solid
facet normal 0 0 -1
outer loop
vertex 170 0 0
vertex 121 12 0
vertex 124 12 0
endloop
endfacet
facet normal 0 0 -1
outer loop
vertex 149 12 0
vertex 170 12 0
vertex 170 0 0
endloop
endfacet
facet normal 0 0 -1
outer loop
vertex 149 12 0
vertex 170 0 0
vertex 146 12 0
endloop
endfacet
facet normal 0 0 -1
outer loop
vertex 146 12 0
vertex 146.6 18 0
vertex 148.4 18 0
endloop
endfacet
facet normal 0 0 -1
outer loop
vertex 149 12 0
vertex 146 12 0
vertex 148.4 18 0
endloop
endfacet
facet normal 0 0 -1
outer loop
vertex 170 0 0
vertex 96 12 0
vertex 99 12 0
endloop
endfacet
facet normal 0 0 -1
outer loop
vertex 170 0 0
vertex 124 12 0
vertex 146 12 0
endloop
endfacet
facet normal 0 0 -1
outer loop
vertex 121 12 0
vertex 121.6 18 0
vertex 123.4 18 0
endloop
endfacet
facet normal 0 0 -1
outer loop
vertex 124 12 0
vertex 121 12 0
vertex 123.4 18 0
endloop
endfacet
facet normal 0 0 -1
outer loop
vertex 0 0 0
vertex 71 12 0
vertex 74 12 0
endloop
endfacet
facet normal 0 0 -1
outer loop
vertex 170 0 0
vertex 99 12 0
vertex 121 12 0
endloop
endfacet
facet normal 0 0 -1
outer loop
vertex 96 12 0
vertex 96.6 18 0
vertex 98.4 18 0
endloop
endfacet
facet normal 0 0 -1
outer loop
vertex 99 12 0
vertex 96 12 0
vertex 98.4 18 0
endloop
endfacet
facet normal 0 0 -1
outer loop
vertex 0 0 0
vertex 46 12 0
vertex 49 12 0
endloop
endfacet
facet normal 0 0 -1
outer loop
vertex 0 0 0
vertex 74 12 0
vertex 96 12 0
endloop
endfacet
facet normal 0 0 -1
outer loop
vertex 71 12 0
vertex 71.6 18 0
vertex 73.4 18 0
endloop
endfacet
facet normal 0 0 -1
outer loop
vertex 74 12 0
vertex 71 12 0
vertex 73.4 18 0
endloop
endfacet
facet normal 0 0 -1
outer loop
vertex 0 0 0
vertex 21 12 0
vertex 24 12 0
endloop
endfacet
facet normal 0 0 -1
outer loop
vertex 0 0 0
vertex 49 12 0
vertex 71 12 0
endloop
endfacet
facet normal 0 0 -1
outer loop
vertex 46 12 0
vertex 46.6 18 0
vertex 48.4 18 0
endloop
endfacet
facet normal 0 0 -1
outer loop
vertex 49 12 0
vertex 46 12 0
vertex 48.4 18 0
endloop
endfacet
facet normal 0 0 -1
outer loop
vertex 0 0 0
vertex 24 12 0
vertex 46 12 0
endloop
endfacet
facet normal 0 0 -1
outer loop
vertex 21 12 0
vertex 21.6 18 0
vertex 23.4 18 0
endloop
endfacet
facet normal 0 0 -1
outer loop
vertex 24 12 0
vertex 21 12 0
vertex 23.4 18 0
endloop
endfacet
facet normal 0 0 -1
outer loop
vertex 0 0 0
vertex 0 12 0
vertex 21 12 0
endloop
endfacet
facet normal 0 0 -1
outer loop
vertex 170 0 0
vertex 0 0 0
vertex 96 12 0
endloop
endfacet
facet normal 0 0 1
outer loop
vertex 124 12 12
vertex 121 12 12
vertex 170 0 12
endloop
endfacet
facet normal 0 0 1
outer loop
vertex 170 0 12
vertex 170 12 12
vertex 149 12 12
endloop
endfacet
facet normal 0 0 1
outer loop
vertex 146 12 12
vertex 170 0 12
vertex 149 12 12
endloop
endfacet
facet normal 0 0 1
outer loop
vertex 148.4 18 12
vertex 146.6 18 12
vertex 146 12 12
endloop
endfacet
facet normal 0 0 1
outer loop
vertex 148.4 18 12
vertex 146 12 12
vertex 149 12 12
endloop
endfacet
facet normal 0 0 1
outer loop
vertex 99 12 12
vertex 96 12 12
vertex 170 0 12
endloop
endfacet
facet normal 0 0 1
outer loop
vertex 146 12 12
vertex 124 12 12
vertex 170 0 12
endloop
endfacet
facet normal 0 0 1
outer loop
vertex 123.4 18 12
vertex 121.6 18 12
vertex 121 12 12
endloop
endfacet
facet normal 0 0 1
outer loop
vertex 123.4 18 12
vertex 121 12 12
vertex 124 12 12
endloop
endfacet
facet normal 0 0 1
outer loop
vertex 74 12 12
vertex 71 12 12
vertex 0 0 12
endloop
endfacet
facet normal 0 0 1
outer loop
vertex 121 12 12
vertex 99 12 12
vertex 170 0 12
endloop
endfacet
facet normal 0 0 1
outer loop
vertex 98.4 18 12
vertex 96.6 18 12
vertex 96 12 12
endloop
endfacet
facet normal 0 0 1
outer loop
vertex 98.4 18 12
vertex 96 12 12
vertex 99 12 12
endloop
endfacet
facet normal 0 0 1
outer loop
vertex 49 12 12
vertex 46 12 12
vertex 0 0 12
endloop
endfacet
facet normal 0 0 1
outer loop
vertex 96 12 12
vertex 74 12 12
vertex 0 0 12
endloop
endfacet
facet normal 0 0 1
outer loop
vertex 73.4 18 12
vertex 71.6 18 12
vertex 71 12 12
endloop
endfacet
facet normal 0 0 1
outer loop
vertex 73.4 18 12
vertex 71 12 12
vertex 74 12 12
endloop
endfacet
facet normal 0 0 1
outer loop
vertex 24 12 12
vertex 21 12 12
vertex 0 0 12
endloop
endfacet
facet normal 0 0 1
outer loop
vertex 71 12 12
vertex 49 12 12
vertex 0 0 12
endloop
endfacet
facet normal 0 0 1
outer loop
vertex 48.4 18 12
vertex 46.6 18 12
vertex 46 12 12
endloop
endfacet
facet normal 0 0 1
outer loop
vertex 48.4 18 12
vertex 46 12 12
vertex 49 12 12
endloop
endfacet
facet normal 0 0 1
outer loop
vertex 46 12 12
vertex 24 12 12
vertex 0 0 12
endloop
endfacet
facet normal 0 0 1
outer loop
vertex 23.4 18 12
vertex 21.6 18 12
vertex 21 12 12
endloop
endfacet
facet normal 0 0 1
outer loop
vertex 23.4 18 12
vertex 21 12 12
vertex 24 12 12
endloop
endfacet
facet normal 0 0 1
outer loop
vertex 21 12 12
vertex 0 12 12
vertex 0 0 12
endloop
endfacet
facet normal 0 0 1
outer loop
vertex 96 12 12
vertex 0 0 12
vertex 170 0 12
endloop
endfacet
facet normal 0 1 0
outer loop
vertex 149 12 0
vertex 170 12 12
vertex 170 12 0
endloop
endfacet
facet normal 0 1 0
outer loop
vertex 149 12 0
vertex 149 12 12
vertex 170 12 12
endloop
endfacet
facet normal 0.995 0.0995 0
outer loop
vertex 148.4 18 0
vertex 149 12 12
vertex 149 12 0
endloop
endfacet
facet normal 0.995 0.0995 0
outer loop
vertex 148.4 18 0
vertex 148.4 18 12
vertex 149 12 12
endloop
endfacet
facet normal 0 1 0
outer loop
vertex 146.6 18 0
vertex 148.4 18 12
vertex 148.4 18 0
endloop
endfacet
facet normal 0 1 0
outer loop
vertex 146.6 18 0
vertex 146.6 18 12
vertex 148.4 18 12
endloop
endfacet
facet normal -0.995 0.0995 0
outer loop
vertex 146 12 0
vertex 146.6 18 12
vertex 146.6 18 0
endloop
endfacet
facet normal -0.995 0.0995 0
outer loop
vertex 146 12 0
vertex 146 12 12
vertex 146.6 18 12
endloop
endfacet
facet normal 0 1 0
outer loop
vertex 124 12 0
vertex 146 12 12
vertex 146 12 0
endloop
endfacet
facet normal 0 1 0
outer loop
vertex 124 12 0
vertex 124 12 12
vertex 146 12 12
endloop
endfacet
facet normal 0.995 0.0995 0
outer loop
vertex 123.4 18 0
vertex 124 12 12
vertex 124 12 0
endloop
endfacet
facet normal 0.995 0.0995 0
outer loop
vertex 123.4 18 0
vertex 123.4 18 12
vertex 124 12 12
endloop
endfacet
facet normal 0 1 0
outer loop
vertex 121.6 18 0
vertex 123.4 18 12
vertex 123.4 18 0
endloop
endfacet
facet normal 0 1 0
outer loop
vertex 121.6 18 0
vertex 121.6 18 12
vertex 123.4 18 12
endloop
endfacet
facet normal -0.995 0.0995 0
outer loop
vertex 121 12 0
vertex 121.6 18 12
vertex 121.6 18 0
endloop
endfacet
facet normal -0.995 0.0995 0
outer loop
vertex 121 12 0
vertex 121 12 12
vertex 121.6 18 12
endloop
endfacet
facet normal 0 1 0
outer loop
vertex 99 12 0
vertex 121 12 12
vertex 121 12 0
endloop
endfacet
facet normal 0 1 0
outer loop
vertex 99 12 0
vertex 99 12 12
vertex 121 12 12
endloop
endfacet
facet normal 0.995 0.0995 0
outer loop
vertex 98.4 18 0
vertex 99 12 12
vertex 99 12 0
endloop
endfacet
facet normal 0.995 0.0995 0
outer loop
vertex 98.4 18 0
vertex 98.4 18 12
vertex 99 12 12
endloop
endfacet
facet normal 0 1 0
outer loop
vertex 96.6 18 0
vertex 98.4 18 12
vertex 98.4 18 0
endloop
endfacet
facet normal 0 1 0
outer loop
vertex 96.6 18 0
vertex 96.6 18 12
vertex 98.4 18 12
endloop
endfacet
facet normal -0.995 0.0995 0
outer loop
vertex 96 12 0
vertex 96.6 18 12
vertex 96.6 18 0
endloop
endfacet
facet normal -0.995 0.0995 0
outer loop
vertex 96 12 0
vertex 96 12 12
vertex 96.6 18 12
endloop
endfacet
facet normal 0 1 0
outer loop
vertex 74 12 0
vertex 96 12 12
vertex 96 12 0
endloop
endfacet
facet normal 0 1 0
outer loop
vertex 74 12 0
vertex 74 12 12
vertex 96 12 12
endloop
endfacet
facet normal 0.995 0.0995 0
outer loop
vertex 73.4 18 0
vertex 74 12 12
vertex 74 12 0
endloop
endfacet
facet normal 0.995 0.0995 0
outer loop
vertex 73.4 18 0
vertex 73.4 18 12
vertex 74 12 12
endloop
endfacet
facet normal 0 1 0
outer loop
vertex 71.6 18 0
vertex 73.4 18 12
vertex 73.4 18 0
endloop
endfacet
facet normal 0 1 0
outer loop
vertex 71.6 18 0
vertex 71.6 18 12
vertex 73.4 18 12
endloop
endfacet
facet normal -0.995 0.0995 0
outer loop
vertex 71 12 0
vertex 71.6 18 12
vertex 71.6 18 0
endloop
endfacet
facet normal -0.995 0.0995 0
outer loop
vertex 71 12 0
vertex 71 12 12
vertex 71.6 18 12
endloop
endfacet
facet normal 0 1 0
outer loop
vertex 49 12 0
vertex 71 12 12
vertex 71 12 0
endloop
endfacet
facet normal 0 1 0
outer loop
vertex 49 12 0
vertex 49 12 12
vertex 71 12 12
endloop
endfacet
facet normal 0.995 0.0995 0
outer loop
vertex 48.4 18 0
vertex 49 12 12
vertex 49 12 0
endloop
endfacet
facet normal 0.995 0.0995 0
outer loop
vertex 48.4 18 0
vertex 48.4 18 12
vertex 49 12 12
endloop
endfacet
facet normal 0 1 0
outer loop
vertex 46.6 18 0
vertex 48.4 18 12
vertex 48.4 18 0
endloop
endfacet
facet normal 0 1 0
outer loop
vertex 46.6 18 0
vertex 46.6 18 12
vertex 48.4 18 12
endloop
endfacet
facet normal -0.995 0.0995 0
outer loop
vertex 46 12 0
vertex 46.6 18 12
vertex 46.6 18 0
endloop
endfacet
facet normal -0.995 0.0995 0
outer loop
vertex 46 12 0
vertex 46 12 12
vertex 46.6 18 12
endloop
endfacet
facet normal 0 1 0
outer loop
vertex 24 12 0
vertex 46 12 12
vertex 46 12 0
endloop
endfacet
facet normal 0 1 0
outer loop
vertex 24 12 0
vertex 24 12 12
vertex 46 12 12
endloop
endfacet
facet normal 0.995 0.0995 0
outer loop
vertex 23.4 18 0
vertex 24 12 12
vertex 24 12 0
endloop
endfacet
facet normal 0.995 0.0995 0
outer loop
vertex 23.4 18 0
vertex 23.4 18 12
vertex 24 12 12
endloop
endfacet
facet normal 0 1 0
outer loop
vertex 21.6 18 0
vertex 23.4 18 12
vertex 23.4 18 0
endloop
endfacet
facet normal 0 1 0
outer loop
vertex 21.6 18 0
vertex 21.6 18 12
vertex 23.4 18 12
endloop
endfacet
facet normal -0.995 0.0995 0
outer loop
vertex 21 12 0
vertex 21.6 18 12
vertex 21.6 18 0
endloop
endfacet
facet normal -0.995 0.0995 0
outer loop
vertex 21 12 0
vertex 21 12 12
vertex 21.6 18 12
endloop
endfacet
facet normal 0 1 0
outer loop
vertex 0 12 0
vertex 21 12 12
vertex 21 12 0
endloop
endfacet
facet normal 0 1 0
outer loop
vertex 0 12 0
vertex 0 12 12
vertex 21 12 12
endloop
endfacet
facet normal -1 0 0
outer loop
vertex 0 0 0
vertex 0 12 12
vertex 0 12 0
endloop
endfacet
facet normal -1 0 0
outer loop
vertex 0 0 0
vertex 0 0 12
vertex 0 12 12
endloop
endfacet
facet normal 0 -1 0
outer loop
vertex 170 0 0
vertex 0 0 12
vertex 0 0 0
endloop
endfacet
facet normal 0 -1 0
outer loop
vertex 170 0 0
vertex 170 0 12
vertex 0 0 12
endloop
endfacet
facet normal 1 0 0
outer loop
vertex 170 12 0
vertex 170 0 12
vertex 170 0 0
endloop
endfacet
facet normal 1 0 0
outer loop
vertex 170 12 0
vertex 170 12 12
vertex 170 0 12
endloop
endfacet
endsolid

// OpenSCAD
$fn = 32;

// ----------------------------------------------------------------------
// Gear rack: 6 teeth on a 170 mm bar, pitch 25 mm
// ----------------------------------------------------------------------

// --- parameters (mm) ---
profile_height = 12;      // extrusion height
profile_points = 28;      // points of the closed outline

profile = [[0, 0], [170, 0], [170, 12], [149, 12], [148.4, 18], [146.6, 18], [146, 12], [124, 12], [123.4, 18], [121.6, 18], [121, 12], [99, 12], [98.4, 18], [96.6, 18], [96, 12], [74, 12], [73.4, 18], [71.6, 18], [71, 12], [49, 12], [48.4, 18], [46.6, 18], [46, 12], [24, 12], [23.4, 18], [21.6, 18], [21, 12], [0, 12]];  // single closed polygon, 28 points, counter clockwise

// --- the one profile operation ---
linear_extrude(height = profile_height) polygon(points = profile);
